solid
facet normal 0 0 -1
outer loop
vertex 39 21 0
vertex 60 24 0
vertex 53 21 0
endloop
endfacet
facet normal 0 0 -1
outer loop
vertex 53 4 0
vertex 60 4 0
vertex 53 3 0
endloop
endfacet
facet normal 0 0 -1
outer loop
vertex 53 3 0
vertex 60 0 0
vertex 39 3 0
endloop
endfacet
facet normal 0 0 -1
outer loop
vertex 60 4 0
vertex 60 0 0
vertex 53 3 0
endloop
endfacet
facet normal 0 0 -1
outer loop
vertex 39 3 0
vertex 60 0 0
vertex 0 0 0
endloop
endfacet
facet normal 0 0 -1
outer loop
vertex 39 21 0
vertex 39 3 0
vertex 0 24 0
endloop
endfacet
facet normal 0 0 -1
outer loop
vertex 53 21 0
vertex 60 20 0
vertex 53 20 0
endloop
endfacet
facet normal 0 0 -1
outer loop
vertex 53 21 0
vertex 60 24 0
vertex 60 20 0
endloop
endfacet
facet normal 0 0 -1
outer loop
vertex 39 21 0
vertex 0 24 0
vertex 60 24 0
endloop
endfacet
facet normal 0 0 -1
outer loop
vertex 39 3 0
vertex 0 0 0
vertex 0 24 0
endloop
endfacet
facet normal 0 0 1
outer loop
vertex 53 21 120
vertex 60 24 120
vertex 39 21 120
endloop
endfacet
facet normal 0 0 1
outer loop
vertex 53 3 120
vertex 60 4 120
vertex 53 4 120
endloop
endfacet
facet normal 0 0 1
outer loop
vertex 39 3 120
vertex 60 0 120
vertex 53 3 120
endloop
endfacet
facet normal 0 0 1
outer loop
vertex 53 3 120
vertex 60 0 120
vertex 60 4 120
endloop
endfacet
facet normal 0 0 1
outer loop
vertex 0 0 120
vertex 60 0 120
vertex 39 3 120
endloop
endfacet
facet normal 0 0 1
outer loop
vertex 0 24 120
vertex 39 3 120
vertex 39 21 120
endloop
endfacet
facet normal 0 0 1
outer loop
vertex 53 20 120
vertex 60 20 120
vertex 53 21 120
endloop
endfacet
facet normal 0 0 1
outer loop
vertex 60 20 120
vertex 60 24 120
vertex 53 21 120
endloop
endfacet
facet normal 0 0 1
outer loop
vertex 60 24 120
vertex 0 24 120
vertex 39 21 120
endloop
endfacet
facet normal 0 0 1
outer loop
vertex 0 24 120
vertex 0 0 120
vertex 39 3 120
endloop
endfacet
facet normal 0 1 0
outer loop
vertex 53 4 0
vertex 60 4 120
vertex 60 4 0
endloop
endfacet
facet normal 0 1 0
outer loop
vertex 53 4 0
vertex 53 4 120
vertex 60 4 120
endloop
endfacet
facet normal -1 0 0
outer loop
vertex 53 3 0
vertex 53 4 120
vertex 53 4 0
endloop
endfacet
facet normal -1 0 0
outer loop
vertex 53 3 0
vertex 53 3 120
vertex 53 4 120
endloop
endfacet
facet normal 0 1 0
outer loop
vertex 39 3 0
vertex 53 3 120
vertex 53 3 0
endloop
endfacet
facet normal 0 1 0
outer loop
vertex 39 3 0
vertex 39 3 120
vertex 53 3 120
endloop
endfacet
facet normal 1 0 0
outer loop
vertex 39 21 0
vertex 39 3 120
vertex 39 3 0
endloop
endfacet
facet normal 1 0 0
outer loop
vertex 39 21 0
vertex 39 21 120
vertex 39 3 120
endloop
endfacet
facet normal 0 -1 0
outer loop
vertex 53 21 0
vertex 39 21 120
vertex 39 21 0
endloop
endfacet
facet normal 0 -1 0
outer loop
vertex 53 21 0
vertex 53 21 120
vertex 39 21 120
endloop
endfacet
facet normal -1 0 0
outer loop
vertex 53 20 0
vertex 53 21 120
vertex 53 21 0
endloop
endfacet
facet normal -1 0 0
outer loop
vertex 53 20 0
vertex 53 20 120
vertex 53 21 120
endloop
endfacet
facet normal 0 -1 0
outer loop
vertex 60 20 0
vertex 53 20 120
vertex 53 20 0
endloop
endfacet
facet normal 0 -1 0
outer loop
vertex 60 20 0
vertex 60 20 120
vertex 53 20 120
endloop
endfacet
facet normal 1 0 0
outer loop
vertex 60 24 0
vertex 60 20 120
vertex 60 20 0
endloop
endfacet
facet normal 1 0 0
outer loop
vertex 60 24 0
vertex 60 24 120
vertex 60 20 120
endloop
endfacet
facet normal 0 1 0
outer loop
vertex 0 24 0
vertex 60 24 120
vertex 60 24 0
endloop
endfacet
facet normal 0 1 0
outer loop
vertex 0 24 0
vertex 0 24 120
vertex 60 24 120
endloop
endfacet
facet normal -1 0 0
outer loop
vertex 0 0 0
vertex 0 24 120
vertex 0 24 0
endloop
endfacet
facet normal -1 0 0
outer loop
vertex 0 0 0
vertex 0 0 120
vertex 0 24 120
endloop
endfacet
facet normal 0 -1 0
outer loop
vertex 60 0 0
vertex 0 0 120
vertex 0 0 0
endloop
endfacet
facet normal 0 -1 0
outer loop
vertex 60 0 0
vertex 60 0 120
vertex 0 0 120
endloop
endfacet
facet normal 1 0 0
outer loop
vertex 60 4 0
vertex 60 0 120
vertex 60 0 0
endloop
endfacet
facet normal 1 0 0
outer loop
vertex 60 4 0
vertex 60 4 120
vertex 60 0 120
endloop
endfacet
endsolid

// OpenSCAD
$fn = 32;

// ----------------------------------------------------------------------
// T-slot rail: 60 x 24 mm section, 120 mm long
// ----------------------------------------------------------------------

// --- parameters (mm) ---
profile_height = 120;     // extrusion height
profile_points = 12;      // points of the closed outline

profile = [[0, 0], [60, 0], [60, 4], [53, 4], [53, 3], [39, 3], [39, 21], [53, 21], [53, 20], [60, 20], [60, 24], [0, 24]];  // single closed polygon, 12 points, counter clockwise

// --- the one profile operation ---
linear_extrude(height = profile_height) polygon(points = profile);
